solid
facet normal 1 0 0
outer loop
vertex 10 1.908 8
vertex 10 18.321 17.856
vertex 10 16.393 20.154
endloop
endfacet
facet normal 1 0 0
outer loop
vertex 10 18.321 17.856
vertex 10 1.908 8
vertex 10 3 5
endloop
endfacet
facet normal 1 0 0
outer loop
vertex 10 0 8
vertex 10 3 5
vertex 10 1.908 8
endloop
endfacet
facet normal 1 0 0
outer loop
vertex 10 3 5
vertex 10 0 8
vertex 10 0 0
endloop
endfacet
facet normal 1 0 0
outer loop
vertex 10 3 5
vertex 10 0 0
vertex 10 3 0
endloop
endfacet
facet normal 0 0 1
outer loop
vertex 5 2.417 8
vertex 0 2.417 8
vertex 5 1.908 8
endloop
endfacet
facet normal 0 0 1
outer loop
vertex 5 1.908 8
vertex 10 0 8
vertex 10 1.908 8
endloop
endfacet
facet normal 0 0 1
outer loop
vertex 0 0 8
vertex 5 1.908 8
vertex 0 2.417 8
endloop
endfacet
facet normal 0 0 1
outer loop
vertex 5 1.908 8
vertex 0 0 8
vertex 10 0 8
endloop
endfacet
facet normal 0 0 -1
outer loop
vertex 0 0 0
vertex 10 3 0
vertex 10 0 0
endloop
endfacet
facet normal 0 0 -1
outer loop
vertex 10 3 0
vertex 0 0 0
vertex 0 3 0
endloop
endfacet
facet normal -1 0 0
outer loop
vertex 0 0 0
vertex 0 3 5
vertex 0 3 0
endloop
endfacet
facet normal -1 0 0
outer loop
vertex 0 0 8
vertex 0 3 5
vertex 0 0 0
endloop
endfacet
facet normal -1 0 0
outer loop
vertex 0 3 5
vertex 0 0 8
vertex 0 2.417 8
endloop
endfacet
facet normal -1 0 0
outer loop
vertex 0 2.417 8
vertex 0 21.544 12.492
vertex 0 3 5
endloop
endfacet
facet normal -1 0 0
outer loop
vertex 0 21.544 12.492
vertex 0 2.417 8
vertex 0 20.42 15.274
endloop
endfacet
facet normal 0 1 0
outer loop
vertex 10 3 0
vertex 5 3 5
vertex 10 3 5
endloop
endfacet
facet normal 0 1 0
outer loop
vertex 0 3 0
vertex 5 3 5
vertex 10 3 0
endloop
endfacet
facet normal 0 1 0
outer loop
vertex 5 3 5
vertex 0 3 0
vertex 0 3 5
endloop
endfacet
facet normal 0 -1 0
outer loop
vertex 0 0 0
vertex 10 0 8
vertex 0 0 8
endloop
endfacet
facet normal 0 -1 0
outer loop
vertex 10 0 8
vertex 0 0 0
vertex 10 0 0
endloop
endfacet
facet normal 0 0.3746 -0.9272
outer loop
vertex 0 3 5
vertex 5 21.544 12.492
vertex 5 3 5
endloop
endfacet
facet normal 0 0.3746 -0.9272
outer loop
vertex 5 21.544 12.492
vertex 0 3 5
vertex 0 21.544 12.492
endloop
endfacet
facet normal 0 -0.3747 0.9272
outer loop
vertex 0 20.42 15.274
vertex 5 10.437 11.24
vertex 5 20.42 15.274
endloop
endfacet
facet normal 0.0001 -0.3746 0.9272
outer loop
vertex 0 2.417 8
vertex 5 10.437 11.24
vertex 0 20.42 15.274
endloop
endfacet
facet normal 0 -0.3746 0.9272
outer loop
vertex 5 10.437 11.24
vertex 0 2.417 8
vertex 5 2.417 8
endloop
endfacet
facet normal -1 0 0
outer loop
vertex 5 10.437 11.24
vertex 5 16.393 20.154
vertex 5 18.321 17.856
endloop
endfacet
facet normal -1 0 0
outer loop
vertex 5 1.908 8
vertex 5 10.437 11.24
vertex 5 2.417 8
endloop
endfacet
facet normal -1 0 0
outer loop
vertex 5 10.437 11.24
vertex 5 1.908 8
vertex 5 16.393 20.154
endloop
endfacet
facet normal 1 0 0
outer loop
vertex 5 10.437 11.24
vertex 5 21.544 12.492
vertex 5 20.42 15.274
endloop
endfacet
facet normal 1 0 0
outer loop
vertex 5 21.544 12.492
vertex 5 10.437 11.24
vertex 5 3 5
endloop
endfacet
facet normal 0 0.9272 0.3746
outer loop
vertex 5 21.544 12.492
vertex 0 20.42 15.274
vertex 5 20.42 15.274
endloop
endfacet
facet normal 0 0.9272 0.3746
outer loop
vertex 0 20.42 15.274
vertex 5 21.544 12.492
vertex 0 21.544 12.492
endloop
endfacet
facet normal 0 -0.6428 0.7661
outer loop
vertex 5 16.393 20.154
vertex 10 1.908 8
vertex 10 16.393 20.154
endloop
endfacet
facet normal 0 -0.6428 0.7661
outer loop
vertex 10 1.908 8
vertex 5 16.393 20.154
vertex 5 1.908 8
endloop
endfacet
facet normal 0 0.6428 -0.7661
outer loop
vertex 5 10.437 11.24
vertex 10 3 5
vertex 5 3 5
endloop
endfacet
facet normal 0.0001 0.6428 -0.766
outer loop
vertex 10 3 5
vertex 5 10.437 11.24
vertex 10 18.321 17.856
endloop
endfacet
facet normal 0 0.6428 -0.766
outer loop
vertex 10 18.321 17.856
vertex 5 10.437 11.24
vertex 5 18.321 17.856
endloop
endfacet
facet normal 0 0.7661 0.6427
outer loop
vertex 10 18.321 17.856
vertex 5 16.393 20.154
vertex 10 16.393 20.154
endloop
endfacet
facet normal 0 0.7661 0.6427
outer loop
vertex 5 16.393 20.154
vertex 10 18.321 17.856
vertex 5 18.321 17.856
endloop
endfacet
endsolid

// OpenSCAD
cube(size=[10, 3, 8]);
translate([0, 3, 5])
rotate([90-68, 0, 0])
cube(size=[5,20,3]);
translate([5, 3, 5])
rotate([90-50, 0, 0])
cube(size=[5,20,3]);
